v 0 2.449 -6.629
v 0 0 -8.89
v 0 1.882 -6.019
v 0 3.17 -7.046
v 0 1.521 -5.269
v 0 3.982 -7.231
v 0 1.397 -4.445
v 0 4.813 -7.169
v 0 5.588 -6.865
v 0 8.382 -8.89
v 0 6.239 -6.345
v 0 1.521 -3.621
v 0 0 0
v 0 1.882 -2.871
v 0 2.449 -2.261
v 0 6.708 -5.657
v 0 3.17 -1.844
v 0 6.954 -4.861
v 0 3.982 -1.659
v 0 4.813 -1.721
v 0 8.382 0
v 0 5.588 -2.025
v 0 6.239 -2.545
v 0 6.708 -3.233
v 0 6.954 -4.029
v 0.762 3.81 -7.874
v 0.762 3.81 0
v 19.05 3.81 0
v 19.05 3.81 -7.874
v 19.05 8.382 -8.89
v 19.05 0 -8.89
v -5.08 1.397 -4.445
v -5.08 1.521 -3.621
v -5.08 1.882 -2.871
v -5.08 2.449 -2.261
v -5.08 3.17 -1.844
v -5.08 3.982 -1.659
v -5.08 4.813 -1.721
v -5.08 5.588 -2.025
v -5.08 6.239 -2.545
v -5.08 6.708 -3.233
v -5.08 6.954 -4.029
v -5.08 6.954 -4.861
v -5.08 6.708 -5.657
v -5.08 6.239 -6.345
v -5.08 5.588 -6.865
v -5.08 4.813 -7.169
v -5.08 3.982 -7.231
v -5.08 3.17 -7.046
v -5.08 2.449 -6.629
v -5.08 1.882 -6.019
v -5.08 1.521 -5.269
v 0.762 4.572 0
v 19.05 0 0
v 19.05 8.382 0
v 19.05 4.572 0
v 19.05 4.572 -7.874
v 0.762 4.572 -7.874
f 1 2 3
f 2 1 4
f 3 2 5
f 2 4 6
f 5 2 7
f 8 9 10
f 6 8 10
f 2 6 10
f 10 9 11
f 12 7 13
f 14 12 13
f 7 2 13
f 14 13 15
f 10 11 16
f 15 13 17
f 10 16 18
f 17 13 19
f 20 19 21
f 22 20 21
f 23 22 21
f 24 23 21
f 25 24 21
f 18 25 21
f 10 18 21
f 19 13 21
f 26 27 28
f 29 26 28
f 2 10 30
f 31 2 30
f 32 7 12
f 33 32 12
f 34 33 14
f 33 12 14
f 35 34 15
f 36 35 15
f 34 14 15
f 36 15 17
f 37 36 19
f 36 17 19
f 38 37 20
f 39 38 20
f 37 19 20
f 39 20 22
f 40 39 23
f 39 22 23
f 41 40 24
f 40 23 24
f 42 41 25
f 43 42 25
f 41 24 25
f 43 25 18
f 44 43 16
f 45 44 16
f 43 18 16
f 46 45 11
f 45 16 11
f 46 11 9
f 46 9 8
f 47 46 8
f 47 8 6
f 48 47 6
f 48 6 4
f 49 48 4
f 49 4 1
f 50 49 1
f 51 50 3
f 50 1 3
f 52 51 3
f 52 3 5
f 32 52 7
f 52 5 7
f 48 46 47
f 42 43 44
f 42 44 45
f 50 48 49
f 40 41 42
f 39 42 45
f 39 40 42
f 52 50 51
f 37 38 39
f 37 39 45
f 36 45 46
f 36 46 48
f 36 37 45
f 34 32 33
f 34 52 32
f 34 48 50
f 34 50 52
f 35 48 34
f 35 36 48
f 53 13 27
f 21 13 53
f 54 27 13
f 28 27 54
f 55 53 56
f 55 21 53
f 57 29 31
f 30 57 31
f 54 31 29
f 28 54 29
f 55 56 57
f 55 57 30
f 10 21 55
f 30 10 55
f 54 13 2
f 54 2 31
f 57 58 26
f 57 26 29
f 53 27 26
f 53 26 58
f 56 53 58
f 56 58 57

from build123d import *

# Parameters (mm, degrees)
SKETCH1_W           = 19.05
SKETCH1_H           = 8.382
BOSS_EXTRUDE2_DEPTH = 8.89
SKETCH3_W           = 18.288
SKETCH3_H           = 0.762
CUT_EXTRUDE1_DEPTH  = 7.874
SKETCH4_R           = 2.794
BOSS_EXTRUDE3_DEPTH = 5.08


with BuildPart() as part:
    # Sketch1 → Boss-Extrude2 (new body)
    with BuildSketch(Plane.XY):
        with Locations((9.525, 4.191)):
            Rectangle(SKETCH1_W, SKETCH1_H)
    extrude(amount=-BOSS_EXTRUDE2_DEPTH)

    # Sketch3 → Cut-Extrude1 (cut)
    with BuildSketch(Plane.XY):
        with Locations((9.906, 4.191)):
            Rectangle(SKETCH3_W, SKETCH3_H)
    extrude(amount=-CUT_EXTRUDE1_DEPTH, mode=Mode.SUBTRACT)

    # Sketch4 → Boss-Extrude3 (add)
    with BuildSketch(Plane.ZY):
        with Locations(Location((-4.445, 4.191, 0), (0, 0, 270))):
            Circle(SKETCH4_R)
    extrude(amount=BOSS_EXTRUDE3_DEPTH)


solid = part.part
